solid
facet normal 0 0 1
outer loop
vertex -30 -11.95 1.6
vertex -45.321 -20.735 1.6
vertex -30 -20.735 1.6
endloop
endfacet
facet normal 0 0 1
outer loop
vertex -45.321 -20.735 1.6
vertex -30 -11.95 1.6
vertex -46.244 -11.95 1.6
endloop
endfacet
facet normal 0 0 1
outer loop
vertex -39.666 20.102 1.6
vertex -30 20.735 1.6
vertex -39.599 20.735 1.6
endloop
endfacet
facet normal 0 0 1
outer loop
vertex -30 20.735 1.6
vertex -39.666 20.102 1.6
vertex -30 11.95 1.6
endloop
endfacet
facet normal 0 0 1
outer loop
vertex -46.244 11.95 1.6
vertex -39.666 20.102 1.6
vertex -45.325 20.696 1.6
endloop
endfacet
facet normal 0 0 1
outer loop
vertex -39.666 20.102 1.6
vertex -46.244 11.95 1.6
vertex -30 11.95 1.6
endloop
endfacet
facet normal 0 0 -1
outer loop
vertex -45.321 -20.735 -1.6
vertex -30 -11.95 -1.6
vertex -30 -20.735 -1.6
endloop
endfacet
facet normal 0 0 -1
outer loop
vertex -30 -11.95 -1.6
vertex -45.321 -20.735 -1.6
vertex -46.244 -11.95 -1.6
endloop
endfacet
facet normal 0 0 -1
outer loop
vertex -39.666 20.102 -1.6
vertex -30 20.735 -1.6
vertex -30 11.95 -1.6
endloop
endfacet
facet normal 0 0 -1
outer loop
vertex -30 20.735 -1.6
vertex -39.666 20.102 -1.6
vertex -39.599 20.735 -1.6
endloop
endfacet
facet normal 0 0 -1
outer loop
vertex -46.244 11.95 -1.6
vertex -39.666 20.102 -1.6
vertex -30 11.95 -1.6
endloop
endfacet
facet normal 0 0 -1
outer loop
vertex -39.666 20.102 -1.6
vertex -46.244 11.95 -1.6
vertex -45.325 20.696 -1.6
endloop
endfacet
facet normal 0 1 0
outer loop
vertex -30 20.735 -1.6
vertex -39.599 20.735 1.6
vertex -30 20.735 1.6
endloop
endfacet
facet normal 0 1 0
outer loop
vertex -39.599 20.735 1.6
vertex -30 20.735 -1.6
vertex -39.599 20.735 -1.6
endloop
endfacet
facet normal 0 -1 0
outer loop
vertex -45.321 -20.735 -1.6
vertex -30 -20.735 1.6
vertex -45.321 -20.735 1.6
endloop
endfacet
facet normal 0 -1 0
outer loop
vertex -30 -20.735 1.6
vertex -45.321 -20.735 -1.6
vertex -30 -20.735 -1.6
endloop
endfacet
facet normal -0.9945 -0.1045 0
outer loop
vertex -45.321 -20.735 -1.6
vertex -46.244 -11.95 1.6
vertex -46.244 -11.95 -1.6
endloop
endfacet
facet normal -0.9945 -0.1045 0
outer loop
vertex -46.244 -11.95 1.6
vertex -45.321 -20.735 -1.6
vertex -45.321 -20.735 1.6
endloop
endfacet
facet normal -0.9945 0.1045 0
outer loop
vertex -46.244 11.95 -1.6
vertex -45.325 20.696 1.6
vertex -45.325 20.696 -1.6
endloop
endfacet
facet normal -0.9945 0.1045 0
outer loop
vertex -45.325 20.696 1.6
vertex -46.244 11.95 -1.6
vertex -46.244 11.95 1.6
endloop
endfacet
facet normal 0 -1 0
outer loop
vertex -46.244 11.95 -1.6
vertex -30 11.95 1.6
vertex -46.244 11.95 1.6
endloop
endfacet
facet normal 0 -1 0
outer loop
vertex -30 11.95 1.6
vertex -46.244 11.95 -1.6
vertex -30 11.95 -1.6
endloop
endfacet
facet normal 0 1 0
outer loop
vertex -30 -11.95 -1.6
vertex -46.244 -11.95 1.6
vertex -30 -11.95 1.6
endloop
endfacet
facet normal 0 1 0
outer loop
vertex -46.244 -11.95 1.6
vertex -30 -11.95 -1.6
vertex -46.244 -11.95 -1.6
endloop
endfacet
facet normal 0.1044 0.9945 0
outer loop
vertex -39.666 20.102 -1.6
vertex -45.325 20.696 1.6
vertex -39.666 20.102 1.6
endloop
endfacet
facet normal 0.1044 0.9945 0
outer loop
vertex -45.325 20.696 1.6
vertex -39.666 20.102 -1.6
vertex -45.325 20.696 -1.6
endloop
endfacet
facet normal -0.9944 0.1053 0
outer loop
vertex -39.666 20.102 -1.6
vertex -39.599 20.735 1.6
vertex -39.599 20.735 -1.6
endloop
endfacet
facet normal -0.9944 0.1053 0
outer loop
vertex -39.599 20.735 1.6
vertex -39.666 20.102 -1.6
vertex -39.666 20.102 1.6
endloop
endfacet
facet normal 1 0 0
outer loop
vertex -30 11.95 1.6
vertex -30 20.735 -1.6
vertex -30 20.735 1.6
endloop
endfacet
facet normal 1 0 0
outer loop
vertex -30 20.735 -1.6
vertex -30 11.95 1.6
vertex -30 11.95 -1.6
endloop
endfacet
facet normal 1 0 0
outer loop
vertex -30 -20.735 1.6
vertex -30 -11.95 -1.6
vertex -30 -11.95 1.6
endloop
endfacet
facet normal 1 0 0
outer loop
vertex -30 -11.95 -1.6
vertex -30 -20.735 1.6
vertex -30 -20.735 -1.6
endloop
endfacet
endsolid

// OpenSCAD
diameter = 595;
heights = 3.20;
mainCubeLength = 95;//95
mainCubeWidth = 41.47;
innerCubeLength = 58;
innerCubeWidth = 23.90;

module railroadCircle(diameter, heights) {
    translate([250, 0, 0]) {
    cylinder(d=diameter, h=heights, center=true);  
    }
};

module mainCube(length, width, heights) {
    cube(size=[length, width, heights], center=true);
};


module innerCube(length, width, heights) {
    translate([-19, 0, 0]) {
    cube(size=[length, width, heights], center=true);  
    }
};

module legoPlate(length, width, heights) {
    translate([-47, 25.9, 0])
    {
    rotate([0,0,84])
    color([0.8,0.5,1]) {
    cube(size=[length, width, heights], center=true);
    }
    }
};

module supportBlock(length, width, heights) {
    translate([-41.1, 14.4, 0])
    {
    rotate([0,0,90])
    color([0.2,0.8,1]) {
    cube(size=[length, width, heights], center=true);   
    }
    }
}

// Building Part 1
union()
{   
    difference() {
        intersection() {
            mainCube(mainCubeLength, mainCubeWidth, heights);
            railroadCircle(diameter, heights);
        }
            #innerCube(innerCubeLength, innerCubeWidth, heights+1);
            #legoPlate(10, 15.8, heights+1);
translate([10, 0, 0]) {
cube(size=[80, 80, heights+1], center=true);
    
}
}
}

    //supportBlock(5, 9.19, heights);
